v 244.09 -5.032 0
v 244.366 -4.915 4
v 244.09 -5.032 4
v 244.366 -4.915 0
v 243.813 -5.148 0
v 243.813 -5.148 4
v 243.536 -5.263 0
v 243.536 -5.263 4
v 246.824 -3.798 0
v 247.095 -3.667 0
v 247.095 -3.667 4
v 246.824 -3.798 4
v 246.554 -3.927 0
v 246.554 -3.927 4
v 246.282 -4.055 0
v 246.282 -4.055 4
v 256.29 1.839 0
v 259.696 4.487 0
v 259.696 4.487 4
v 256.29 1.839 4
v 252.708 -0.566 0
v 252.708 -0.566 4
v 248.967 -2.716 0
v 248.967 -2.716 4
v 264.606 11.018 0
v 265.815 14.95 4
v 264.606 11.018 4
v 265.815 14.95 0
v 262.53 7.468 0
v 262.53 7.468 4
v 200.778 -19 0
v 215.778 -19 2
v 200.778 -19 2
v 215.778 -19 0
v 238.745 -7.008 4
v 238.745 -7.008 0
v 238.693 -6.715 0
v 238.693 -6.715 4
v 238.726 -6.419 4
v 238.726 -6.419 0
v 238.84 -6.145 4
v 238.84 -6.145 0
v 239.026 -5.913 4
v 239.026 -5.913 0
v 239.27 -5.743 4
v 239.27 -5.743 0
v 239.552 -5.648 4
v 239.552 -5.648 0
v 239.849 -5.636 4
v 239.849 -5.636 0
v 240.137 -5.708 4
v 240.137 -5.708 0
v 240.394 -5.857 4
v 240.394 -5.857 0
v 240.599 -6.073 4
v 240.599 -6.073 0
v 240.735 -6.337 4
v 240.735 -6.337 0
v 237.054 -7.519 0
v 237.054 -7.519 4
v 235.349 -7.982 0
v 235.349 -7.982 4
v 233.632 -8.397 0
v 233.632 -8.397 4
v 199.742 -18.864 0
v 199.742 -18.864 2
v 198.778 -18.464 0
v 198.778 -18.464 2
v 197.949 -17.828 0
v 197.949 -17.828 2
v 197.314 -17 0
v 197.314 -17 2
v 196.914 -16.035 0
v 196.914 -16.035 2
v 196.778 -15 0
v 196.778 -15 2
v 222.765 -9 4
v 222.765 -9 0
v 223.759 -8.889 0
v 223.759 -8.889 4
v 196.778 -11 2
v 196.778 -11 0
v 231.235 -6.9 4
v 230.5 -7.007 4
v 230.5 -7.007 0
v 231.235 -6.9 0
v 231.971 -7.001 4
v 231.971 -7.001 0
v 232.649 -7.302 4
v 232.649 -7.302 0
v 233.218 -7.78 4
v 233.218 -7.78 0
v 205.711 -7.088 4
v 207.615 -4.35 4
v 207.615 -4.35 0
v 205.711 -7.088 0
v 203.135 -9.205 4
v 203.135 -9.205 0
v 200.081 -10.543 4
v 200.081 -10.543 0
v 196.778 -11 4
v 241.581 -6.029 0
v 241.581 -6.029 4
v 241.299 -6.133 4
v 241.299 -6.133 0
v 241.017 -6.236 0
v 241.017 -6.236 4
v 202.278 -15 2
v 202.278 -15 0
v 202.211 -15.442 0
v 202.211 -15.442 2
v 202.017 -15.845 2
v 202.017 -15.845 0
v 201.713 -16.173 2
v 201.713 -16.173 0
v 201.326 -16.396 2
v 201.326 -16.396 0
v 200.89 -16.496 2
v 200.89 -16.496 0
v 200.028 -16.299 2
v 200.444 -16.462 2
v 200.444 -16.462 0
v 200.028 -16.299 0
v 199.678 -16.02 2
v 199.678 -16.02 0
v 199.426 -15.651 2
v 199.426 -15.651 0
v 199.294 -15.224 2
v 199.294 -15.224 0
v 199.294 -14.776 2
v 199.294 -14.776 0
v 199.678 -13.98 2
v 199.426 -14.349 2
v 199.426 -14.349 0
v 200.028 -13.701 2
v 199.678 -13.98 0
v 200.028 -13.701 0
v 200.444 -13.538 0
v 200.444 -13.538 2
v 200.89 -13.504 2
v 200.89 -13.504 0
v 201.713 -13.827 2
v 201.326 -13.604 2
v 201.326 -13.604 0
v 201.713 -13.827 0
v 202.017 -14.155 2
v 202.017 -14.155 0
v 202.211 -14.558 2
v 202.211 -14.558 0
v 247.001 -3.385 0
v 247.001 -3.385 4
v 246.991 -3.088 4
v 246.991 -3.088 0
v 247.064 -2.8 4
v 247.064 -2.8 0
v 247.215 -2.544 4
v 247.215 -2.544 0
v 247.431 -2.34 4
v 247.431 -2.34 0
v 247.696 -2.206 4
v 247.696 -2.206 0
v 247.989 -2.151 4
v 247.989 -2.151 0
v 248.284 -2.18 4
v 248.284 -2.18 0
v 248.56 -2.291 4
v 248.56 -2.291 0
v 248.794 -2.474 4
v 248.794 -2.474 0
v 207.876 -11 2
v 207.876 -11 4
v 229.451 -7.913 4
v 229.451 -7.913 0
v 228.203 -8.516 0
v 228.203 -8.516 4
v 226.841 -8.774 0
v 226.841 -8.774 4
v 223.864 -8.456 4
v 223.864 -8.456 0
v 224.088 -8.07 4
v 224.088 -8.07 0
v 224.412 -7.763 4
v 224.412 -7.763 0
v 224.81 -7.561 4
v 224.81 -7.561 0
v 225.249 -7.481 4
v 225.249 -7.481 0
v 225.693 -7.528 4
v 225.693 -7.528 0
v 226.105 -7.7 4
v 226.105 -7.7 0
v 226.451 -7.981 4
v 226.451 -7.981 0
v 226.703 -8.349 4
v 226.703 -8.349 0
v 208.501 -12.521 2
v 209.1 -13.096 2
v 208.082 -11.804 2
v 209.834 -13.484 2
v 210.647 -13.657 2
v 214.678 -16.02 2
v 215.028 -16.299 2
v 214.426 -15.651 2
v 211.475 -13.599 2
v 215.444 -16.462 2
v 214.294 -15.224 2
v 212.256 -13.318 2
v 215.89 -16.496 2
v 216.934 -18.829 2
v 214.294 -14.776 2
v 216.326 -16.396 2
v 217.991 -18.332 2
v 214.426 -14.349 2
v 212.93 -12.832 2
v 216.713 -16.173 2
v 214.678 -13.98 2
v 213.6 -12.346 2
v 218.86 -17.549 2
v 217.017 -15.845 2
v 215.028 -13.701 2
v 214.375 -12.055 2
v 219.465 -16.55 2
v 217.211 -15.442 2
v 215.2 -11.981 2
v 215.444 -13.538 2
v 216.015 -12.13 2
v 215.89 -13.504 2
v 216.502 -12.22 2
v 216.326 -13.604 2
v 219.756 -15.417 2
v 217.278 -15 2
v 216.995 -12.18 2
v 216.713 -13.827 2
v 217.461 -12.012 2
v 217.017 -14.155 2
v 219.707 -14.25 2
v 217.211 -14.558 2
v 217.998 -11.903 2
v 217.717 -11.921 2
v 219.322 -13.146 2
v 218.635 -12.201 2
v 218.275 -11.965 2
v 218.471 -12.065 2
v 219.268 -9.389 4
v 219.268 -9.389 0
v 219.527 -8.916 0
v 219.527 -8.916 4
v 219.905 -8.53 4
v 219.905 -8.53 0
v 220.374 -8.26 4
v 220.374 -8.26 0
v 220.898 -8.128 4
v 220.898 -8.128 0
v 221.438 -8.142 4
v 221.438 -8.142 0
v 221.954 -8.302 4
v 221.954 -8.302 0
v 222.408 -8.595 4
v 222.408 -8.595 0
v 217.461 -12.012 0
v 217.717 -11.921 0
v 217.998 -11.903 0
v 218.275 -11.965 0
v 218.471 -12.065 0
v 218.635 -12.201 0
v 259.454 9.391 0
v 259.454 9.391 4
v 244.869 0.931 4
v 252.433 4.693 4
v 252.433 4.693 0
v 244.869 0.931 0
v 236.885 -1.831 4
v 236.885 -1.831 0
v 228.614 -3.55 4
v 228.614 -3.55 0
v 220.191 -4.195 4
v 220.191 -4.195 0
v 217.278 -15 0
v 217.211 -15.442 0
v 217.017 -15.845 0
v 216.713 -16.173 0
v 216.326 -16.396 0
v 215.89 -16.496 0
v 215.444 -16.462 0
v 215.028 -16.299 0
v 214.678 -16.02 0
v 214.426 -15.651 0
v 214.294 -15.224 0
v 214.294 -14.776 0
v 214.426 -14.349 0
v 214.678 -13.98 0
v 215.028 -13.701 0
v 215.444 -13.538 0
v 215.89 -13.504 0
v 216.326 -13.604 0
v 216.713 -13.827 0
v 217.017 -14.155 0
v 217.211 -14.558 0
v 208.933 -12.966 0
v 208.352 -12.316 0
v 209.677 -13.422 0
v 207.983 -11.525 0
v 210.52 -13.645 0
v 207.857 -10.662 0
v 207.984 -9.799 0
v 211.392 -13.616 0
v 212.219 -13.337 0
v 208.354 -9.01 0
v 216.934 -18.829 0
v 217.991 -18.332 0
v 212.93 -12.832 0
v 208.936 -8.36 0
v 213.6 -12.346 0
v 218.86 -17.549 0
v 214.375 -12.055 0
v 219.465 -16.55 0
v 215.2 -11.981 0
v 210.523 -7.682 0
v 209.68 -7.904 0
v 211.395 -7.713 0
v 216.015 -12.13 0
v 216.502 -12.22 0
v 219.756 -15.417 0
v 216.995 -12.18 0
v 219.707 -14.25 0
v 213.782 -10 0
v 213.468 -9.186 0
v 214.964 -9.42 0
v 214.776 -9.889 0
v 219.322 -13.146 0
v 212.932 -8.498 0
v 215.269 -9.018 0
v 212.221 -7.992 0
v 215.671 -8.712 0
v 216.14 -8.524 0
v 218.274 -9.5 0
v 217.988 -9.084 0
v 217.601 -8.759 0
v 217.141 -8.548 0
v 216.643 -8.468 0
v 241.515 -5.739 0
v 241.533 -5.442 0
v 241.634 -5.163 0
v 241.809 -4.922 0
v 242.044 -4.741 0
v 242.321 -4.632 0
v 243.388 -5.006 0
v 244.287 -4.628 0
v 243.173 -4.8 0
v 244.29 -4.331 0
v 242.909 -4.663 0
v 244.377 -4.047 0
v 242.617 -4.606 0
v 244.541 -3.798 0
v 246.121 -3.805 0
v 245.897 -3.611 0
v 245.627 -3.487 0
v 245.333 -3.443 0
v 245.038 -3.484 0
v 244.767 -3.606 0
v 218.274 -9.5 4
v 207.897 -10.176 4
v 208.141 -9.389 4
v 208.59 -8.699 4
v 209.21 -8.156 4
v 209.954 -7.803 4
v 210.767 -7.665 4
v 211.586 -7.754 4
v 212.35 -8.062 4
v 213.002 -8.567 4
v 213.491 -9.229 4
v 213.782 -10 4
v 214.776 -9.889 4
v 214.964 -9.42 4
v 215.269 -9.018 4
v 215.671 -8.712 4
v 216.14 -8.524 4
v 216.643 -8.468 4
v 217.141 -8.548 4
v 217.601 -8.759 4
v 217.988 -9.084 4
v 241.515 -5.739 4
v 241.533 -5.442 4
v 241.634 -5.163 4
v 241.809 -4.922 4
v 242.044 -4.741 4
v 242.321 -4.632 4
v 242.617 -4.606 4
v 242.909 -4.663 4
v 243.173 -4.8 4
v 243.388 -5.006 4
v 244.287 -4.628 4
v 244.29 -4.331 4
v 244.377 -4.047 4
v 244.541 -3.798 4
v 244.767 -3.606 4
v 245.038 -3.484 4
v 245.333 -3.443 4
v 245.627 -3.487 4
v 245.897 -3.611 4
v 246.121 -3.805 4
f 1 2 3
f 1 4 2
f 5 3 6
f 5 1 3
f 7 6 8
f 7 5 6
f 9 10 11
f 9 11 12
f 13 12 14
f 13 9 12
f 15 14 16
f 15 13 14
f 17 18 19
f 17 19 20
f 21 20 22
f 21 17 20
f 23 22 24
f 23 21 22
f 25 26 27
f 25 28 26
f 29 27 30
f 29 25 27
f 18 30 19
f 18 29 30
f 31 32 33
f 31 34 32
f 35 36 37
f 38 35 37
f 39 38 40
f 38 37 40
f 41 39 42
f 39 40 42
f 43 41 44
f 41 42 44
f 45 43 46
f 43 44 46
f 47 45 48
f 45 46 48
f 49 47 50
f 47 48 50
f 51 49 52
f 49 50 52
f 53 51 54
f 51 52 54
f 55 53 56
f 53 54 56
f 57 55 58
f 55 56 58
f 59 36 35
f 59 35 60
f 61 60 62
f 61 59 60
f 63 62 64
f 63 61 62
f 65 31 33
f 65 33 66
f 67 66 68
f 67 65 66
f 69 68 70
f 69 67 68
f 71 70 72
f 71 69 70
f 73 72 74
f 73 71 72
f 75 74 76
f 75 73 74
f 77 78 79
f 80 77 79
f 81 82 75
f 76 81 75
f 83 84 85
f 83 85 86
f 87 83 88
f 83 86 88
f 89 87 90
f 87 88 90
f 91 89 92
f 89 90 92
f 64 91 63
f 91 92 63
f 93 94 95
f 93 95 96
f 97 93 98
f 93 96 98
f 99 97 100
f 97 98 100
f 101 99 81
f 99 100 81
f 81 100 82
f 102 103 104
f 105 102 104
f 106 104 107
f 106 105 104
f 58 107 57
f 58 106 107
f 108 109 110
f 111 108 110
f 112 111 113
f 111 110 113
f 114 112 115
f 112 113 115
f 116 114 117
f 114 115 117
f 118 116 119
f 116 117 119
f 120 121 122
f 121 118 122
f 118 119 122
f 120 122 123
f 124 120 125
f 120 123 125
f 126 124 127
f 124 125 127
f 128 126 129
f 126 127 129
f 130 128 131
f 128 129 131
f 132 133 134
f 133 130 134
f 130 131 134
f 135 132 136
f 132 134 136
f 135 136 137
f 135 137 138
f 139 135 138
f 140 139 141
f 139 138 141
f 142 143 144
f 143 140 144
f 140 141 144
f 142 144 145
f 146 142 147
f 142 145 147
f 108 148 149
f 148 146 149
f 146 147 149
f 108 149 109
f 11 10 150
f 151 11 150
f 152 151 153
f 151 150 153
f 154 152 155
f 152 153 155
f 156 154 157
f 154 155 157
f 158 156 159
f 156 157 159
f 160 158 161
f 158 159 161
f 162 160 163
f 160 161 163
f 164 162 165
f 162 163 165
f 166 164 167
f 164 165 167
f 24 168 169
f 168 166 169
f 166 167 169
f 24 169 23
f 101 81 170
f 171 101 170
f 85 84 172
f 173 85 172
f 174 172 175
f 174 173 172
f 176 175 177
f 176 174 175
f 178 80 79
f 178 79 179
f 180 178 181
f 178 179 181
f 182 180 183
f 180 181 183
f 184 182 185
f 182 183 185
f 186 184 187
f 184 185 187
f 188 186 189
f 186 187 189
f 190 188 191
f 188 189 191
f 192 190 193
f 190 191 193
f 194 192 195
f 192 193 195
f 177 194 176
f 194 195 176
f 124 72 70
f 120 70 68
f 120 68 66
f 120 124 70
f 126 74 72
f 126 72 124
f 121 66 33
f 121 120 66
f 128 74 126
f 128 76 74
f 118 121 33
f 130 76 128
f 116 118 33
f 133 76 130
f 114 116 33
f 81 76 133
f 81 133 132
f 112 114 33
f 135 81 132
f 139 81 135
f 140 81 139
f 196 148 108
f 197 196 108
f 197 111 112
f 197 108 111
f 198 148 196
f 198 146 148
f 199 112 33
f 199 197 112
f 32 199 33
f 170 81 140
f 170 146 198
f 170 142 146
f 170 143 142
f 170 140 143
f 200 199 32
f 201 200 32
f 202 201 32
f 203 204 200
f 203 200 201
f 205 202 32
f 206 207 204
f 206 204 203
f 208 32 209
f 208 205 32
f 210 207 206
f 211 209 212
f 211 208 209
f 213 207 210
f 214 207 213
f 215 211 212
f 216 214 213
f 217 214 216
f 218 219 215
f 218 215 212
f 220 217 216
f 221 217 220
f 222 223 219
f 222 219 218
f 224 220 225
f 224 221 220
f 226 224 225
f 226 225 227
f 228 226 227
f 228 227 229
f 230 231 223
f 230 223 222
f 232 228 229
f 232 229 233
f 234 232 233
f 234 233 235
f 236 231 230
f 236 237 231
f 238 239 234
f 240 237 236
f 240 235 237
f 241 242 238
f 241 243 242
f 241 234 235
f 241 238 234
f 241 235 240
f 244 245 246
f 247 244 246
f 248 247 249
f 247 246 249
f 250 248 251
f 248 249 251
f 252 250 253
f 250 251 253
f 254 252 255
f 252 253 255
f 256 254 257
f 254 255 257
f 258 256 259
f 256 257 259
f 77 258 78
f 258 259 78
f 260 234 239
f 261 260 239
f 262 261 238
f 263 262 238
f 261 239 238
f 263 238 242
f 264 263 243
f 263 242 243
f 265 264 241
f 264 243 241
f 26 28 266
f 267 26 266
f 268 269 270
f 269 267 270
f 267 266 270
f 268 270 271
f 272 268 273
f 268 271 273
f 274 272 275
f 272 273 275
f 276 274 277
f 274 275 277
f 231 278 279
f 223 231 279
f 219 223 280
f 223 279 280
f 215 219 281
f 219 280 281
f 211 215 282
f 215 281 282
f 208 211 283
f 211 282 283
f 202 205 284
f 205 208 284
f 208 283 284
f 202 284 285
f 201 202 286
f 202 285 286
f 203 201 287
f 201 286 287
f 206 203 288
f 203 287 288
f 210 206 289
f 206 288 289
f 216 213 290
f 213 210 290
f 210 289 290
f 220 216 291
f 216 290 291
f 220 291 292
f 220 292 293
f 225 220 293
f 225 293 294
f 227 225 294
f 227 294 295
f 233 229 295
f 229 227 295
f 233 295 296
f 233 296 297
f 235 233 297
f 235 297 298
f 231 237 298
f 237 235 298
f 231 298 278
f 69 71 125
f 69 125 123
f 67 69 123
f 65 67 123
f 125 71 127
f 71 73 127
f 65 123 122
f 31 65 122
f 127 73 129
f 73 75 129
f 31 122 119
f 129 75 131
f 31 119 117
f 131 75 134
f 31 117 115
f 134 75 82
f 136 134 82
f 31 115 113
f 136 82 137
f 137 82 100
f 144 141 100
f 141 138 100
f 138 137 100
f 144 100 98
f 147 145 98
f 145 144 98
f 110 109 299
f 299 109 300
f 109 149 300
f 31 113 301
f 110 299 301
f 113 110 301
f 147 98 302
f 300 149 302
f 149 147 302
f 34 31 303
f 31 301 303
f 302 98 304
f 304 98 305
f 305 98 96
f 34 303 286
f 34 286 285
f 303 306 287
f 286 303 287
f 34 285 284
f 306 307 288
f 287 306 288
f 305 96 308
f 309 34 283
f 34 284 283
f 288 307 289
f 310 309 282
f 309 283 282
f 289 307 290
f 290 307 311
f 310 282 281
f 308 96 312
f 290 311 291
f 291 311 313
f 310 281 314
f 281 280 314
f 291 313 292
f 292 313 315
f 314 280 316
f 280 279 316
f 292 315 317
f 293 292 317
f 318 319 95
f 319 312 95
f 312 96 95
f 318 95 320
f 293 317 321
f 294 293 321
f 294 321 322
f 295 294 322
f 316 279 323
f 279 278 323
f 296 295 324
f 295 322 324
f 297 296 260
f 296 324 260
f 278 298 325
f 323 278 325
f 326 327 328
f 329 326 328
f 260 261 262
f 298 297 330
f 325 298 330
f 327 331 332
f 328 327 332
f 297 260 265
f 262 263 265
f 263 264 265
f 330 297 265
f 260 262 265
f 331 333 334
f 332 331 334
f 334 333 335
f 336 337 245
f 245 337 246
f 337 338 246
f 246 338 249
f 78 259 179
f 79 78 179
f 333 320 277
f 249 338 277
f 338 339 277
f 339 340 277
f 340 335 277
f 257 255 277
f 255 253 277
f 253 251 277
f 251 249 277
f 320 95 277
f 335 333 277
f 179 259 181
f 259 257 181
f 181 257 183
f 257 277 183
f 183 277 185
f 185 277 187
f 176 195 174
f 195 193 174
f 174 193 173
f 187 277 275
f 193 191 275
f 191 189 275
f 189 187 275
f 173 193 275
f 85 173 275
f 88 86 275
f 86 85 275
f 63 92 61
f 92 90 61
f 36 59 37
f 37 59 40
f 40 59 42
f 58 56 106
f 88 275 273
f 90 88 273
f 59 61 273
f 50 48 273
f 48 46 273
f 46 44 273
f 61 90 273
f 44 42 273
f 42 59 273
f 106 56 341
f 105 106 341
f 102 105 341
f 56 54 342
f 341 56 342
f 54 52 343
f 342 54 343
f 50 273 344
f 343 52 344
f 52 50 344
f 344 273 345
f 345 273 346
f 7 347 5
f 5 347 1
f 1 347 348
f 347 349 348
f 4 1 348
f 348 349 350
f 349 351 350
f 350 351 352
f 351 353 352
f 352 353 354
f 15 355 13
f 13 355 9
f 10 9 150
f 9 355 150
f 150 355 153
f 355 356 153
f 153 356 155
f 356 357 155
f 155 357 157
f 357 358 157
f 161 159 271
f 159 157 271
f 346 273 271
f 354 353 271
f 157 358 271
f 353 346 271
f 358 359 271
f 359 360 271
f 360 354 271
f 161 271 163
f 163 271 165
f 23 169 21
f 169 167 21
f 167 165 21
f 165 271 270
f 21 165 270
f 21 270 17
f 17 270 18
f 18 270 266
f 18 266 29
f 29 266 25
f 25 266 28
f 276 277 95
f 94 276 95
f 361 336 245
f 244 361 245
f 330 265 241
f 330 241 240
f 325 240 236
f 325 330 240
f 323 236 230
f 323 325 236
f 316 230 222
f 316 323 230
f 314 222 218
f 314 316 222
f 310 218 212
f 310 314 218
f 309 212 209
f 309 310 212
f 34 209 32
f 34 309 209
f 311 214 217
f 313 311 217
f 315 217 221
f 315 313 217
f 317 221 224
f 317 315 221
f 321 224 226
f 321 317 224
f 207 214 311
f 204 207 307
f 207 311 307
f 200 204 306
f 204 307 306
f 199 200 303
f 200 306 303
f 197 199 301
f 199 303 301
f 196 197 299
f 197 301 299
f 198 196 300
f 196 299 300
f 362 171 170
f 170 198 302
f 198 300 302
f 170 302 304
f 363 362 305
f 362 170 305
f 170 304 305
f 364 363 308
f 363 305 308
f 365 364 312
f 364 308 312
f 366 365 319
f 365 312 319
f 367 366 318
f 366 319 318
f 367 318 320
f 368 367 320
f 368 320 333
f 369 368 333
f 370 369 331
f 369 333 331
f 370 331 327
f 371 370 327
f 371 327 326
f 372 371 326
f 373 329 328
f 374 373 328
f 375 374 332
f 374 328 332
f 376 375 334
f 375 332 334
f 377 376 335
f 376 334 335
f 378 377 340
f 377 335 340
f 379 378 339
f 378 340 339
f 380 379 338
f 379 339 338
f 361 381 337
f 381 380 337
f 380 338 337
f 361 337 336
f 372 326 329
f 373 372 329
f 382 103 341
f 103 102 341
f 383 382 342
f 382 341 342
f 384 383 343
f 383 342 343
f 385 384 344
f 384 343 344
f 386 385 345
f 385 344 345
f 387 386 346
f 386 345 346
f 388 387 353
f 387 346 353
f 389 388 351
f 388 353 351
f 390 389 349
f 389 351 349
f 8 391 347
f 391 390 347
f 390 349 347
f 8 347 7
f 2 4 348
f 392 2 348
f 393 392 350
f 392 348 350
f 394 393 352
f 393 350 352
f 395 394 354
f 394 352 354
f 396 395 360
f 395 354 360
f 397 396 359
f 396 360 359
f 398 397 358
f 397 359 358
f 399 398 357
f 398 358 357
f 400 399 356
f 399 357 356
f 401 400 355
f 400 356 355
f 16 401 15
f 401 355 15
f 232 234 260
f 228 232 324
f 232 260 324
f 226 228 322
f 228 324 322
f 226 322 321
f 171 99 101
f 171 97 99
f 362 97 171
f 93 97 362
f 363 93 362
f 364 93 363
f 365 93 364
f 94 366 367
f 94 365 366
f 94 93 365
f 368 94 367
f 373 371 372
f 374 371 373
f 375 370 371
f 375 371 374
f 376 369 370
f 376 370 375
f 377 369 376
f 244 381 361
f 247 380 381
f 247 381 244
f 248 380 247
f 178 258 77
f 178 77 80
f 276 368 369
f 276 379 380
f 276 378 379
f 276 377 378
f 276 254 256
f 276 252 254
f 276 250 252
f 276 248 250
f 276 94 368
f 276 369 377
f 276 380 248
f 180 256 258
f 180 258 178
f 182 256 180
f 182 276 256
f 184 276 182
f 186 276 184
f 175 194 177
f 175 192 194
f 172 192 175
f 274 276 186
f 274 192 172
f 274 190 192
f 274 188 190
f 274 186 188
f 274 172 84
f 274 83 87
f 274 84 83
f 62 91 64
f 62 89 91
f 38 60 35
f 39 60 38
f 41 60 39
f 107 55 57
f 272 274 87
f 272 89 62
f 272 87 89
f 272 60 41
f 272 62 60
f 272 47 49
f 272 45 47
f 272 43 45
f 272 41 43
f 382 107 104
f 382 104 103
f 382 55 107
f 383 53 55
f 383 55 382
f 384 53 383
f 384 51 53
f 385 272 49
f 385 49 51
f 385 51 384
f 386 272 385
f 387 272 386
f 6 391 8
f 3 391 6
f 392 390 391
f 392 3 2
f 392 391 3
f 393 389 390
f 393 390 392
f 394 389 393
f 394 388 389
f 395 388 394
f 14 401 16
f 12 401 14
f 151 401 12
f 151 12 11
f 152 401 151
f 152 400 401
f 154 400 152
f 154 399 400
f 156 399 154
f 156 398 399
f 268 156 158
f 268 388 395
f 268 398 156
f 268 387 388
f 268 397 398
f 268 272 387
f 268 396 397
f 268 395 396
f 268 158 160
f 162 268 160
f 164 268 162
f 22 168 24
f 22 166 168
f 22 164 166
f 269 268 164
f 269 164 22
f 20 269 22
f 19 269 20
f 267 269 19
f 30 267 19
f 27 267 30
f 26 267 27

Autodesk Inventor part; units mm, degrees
ref_plane "YZ Plane" through (0, 0, 0) normal (1, 0, 0) x (0, 1, 0)
ref_plane "XZ Plane" through (0, 0, 0) normal (0, 1, 0) x (-1, 0, 0)
ref_plane "XY Plane" through (0, 0, 0) normal (0, 0, 1) x (1, 0, 0)
sketch "スケッチ1" plane through (0, 0, 0) normal (0, 0, 1) x (1, 0, 0)
  circle A0 centre (0, 0) radius 2
  circle A1 centre (15, 0) radius 2
  arc A2 (-0.2273, 4.9948) -> (-3.6359, -3.4322) centre (0, 0) ccw
  circle A3 centre (55, 0) radius 2
  circle A4 centre (43.6863, -14) radius 2
  circle A5 centre (55, 0) radius 5.025
  arc A6 (58.5132, 7.2151) -> (53.7727, 7.9306) centre (55, 0) ccw
  arc A7 (47.9053, -14.5126) -> (46.3576, -10.6944) centre (43.6863, -14) ccw
  line L0 (80, -19) -> (95, -19)
  circle A8 centre (95, -15) radius 2
  circle A9 centre (80, -15) radius 2
  arc A10 (95, -19) -> (96.7511, -11.4037) centre (95, -15) ccw
  circle A11 centre (80, -15) radius 4 construction
  line L1 (55.7328, -19) -> (80, -19)
  line L2 (58.5132, 7.2151) -> (96.7511, -11.4037)
  arc A12 (41.3268, -1.451) -> (46.3576, -10.6944) centre (55, 0) ccw
  arc A13 (60.1221, -5.4785) -> (54.6591, 7.4922) centre (55, 0) ccw
  line L3 (-0.2273, 4.9948) -> (54.6591, 7.4922)
  circle A14 centre (13, -14.5) radius 1.5
  arc A15 (9.7277, -17.589) -> (13, -19) centre (13, -14.5) ccw
  line L4 (-3.6359, -3.4322) -> (9.7277, -17.589)
  arc A16 (43.6863, -19) -> (47.101, -17.6524) centre (43.6863, -14) ccw
  line L5 (47.9053, -14.5126) -> (53.1517, -18.1862)
  line L6 (13, -19) -> (43.6863, -19)
  line L7 (47.101, -17.6524) -> (60.1221, -5.4785)
  circle A17 centre (66.8562, -1.8523) radius 1.5
  circle A18 centre (66.8562, -1.8523) radius 4.5 construction
  arc A19 (41.3268, -1.451) -> (37.1005, 2.3505) centre (37.1005, -1.8995) ccw
  line L8 (37.1005, 5.3505) -> (53.7727, 7.9306)
  line L9 (37.1005, 5.3505) -> (37.1005, 2.3505)
  circle A20 centre (55.7328, -14.5) radius 1.5
  arc A21 (53.1517, -18.1862) -> (55.7328, -19) centre (55.7328, -14.5) ccw
  arc A22 (80, -11) -> (80, -19) centre (80, -15) ccw
  line L10 (358.0202, -11) -> (380, -19)
  line L11 (380, -19) -> (80, -19)
  circle A23 centre (348.0202, -15) radius 1.25
  circle A24 centre (333.0202, -15) radius 1.25
  circle A25 centre (318.0202, -15) radius 1.25
  circle A26 centre (303.0202, -15) radius 1.25
  line L12 (80, -11) -> (207.8755, -11)
  line L13 (358.0202, -11) -> (248.9511, -11)
  arc A27 (213.7823, -10) -> (213.8378, -11) centre (210.8567, -10.6639) ccw
  line L14 (213.7823, -10) -> (214.7761, -9.8894)
  line L15 (213.8378, -11) -> (214.8378, -11)
  line L16 (219.357, -11) -> (218.357, -11)
  line L17 (218.2737, -9.5) -> (219.2676, -9.3894)
  line L18 (222.8762, -11) -> (223.8762, -11)
  line L19 (222.7652, -9) -> (223.7591, -8.8894)
  arc A28 (214.8378, -11) -> (218.357, -11) centre (216.5974, -10.3453) ccw
  arc A29 (218.2737, -9.5) -> (214.7761, -9.8894) centre (216.5974, -10.3453) ccw
  arc A30 (219.357, -11) -> (222.8762, -11) centre (221.1166, -10.0946) ccw
  arc A31 (222.7652, -9) -> (219.2676, -9.3894) centre (221.1166, -10.0946) ccw
  line L20 (210.8567, -10.6639) -> (233.0155, -9.4343) construction
  arc A32 (223.8762, -11) -> (229.892, -10.6107) centre (226.7628, -8.9308) ccw
  arc A33 (226.8407, -8.7739) -> (223.7591, -8.8894) centre (225.3075, -9.0352) ccw
  arc A34 (226.8407, -8.7739) -> (230.4998, -7.0068) centre (226.5478, -3.4953) ccw
  arc A35 (233.6316, -8.397) -> (230.4998, -7.0068) centre (231.2455, -9.5496) ccw
  arc A36 (235.4619, -12.6053) -> (229.892, -10.6107) centre (230.3136, -18.2076) ccw
  arc A37 (235.4619, -12.6053) -> (239.6511, -11) centre (234.0497, -2.6513) ccw
  arc A38 (259.6965, 4.4867) -> (265.8152, 14.9495) centre (248.2498, 18.2013) ccw
  arc A39 (220.191, -4.195) -> (265.8152, 14.9495) centre (219.3797, 61.6752) ccw
  line L21 (220.191, -4.195) -> (207.615, -4.3499)
  arc A40 (196.7777, -11) -> (207.615, -4.3499) centre (196.7777, 1.1554) ccw
  line L22 (222.8762, -11) -> (240.076, -10.0456) construction
  line L23 (222.7652, -9) -> (239.478, -8.0726) construction
  line L24 (239.6511, -11) -> (240.6511, -11)
  arc A41 (240.6511, -11) -> (242.7511, -11) centre (241.7011, -11) ccw
  line L25 (242.7511, -11) -> (243.7511, -11)
  arc A42 (243.7511, -11) -> (245.8511, -11) centre (244.8011, -11) ccw
  line L26 (245.8511, -11) -> (246.8511, -11)
  arc A43 (246.8511, -11) -> (248.9511, -11) centre (247.9011, -11) ccw
  arc A44 (240.735, -6.337) -> (238.7449, -7.0075) centre (239.7428, -6.6807) ccw
  arc A45 (243.5362, -5.2633) -> (241.5809, -6.0291) centre (242.5618, -5.6544) ccw
  arc A46 (246.2823, -4.0554) -> (244.3663, -4.9148) centre (245.3279, -4.4932) ccw
  arc A47 (248.9668, -2.7162) -> (247.0946, -3.6672) centre (248.0347, -3.1996) ccw
  arc A48 (233.6316, -8.397) -> (238.7449, -7.0075) centre (219.9279, 52.1342) ccw
  arc A49 (240.735, -6.337) -> (241.5809, -6.0291) centre (219.9279, 52.1342) ccw
  arc A50 (243.5362, -5.2633) -> (244.3663, -4.9148) centre (219.9279, 52.1342) ccw
  arc A51 (246.2823, -4.0554) -> (247.0946, -3.6672) centre (219.9279, 52.1342) ccw
  arc A52 (248.9668, -2.7162) -> (259.6965, 4.4867) centre (219.9279, 52.1342) ccw
  line L27 (196.7777, -11) -> (196.7777, -15)
  circle A53 centre (200.7777, -15) radius 1.25
  circle A54 centre (215.7777, -15) radius 1.25
  arc A55 (196.7777, -15) -> (200.7777, -19) centre (200.7777, -15) ccw
  arc A56 (215.7777, -19) -> (217.9536, -11.6436) centre (215.7777, -15) ccw
  circle A57 centre (200.7777, -15) radius 1.5
  circle A58 centre (215.7777, -15) radius 1.5
  line L28 (200.7777, -19) -> (215.7777, -19)
  dimension "d0" = 4
  dimension "d1" = 4
  dimension "d2" = 15
  dimension "d3" = 3
  dimension "d4" = 4
  dimension "d5" = 4
  dimension "d6" = 10.05
  dimension "d7" = 3
  dimension "d8" = 8.5
  dimension "d9" = 4
  dimension "d10" = 4
  dimension "d11" = 15
  dimension "d12" = 15
  dimension "d13" = 3
  dimension "d14" = 3
  dimension "d15" = 3
  dimension "d16" = 35
  dimension "d17" = 3
  dimension "d18" = 40
  dimension "d19" = 40
  dimension "d20" = 18
  dimension "d21" = 15
  dimension "d22" = 13
  dimension "d23" = 8.5
  dimension "d24" = 18
  dimension "d25" = 45
  dimension "d26" = 3
  dimension "d27" = 3
  dimension "d28" = 3
  dimension "d29" = 3
  dimension "d30" = 8
  dimension "d31" = 380
  dimension "d32" = 20
  dimension "d33" = 4
  dimension "d34" = 8
  dimension "d35" = 2.5
  dimension "d36" = 2.5
  dimension "d37" = 2.5
  dimension "d38" = 2.5
  dimension "d39" = 4
  dimension "d40" = 15
  dimension "d41" = 15
  dimension "d42" = 15
  dimension "d43" = 10
  dimension "d44" = 6
  dimension "d45" = 1
  dimension "d46" = 1.5
  dimension "d47" = 1
  dimension "d48" = 1
  dimension "d49" = 1
  dimension "d50" = 2
  dimension "d51" = 1
  dimension "d52" = 1.0015
  dimension "d53" = 1.0015
  dimension "d54" = 0.7511
  dimension "d55" = 0.7511
  dimension "d56" = 3.176
  dimension "d57" = 3.176
  dimension "d58" = 1.05
  dimension "d59" = 1.05
  dimension "d60" = 1.05
  dimension "d61" = 1
  dimension "d62" = 1
  dimension "d63" = 1
extrude "押し出し1" add sketch "スケッチ1" along normal blind 4 contours A40 L21 A39 A38 A52 A47 A51 A46 A50 A45 A49 A44 A48 A35 A34 A33 L19 A31 L17 A29 L14 A27 L12
extrude "押し出し2" add sketch "スケッチ1" along normal blind 2 contours L12 A27 L15 A28 A56 L11 A55 L27
sketch "スケッチ2" plane through (0, 0, 0) normal (0, 0, -1) x (-1, 0, 0)
  circle A0 centre (-200.7777, -15) radius 1.5 projected
  circle A1 centre (-215.7777, -15) radius 1.5 projected
  arc A2 (-213.8378, -11) -> (-213.7823, -10) centre (-210.8567, -10.6639) ccw projected
  line L0 (-214.8378, -11) -> (-213.8378, -11) projected
  arc A3 (-217.9536, -11.6436) -> (-214.8378, -11) centre (-216.5974, -10.3453) ccw projected
  arc A4 (-217.9536, -11.6436) -> (-215.7777, -19) centre (-215.7777, -15) ccw projected
  line L1 (-200.7777, -19) -> (-215.7777, -19) projected
  arc A5 (-200.7777, -19) -> (-196.7777, -15) centre (-200.7777, -15) ccw projected
  line L2 (-196.7777, -11) -> (-196.7777, -15) projected
  arc A6 (-207.615, -4.3499) -> (-196.7777, -11) centre (-196.7777, 1.1554) ccw projected
  line L3 (-220.191, -4.195) -> (-207.615, -4.3499) projected
  arc A7 (-265.8152, 14.9495) -> (-220.191, -4.195) centre (-219.3797, 61.6752) ccw projected
  arc A8 (-265.8152, 14.9495) -> (-259.6965, 4.4867) centre (-248.2498, 18.2013) ccw projected
  arc A9 (-259.6965, 4.4867) -> (-248.9668, -2.7162) centre (-219.9279, 52.1342) ccw projected
  arc A10 (-247.0946, -3.6672) -> (-248.9668, -2.7162) centre (-248.0347, -3.1996) ccw projected
  arc A11 (-247.0946, -3.6672) -> (-246.2823, -4.0554) centre (-219.9279, 52.1342) ccw projected
  arc A12 (-244.3663, -4.9148) -> (-246.2823, -4.0554) centre (-245.3279, -4.4932) ccw projected
  arc A13 (-244.3663, -4.9148) -> (-243.5362, -5.2633) centre (-219.9279, 52.1342) ccw projected
  arc A14 (-241.5809, -6.0291) -> (-243.5362, -5.2633) centre (-242.5618, -5.6544) ccw projected
  arc A15 (-241.5809, -6.0291) -> (-240.735, -6.337) centre (-219.9279, 52.1342) ccw projected
  arc A16 (-238.7449, -7.0075) -> (-240.735, -6.337) centre (-239.7428, -6.6807) ccw projected
  arc A17 (-238.7449, -7.0075) -> (-233.6316, -8.397) centre (-219.9279, 52.1342) ccw projected
  arc A18 (-230.4998, -7.0068) -> (-233.6316, -8.397) centre (-231.2455, -9.5496) ccw projected
  arc A19 (-230.4998, -7.0068) -> (-226.8407, -8.7739) centre (-226.5478, -3.4953) ccw projected
  arc A20 (-223.7591, -8.8894) -> (-226.8407, -8.7739) centre (-225.3075, -9.0352) ccw projected
  line L4 (-222.7652, -9) -> (-223.7591, -8.8894) projected
  arc A21 (-219.2676, -9.3894) -> (-222.7652, -9) centre (-221.1166, -10.0946) ccw projected
  line L5 (-218.2737, -9.5) -> (-219.2676, -9.3894) projected
  arc A22 (-214.7761, -9.8894) -> (-218.2737, -9.5) centre (-216.5974, -10.3453) ccw projected
  line L6 (-213.7823, -10) -> (-214.7761, -9.8894) projected
  arc A23 (-213.8378, -11) -> (-207.8755, -11) centre (-210.8567, -10.6639) ccw projected
  circle A24 centre (-214.2944, -10.9995) radius 1.05
  arc A25 (-217.9536, -11.6436) -> (-214.8378, -11) centre (-216.5974, -10.3453) ccw projected
  arc A26 (-212.9299, -12.8322) -> (-216.0149, -12.1301) centre (-215.059, -15.0588) ccw
  arc A27 (-217.9536, -11.6436) -> (-214.8378, -11) centre (-216.5974, -10.3453) ccw projected
  point P0 (0, 0)
  point P1 (-216.0149, -12.1301)
  point P2 (-212.9299, -12.8322)
  dimension "d83" = 2.1
extrude "押し出し3" cut sketch "スケッチ2" against normal blind 10 contours A26 A24 A2 | A24 A3 L0 A2 | A26 A3 A24 picked at (-214.4032, -11.5037)
fillet "フィレット1" radius 1 1 edges at (217.9536, -11.6436, 1)
equation "\"d53\" = d52"
equation "\"d55\" = d54"
equation "\"d57\" = d56"
properties part number "シールド殺し" material "アルミニウム 7075"
